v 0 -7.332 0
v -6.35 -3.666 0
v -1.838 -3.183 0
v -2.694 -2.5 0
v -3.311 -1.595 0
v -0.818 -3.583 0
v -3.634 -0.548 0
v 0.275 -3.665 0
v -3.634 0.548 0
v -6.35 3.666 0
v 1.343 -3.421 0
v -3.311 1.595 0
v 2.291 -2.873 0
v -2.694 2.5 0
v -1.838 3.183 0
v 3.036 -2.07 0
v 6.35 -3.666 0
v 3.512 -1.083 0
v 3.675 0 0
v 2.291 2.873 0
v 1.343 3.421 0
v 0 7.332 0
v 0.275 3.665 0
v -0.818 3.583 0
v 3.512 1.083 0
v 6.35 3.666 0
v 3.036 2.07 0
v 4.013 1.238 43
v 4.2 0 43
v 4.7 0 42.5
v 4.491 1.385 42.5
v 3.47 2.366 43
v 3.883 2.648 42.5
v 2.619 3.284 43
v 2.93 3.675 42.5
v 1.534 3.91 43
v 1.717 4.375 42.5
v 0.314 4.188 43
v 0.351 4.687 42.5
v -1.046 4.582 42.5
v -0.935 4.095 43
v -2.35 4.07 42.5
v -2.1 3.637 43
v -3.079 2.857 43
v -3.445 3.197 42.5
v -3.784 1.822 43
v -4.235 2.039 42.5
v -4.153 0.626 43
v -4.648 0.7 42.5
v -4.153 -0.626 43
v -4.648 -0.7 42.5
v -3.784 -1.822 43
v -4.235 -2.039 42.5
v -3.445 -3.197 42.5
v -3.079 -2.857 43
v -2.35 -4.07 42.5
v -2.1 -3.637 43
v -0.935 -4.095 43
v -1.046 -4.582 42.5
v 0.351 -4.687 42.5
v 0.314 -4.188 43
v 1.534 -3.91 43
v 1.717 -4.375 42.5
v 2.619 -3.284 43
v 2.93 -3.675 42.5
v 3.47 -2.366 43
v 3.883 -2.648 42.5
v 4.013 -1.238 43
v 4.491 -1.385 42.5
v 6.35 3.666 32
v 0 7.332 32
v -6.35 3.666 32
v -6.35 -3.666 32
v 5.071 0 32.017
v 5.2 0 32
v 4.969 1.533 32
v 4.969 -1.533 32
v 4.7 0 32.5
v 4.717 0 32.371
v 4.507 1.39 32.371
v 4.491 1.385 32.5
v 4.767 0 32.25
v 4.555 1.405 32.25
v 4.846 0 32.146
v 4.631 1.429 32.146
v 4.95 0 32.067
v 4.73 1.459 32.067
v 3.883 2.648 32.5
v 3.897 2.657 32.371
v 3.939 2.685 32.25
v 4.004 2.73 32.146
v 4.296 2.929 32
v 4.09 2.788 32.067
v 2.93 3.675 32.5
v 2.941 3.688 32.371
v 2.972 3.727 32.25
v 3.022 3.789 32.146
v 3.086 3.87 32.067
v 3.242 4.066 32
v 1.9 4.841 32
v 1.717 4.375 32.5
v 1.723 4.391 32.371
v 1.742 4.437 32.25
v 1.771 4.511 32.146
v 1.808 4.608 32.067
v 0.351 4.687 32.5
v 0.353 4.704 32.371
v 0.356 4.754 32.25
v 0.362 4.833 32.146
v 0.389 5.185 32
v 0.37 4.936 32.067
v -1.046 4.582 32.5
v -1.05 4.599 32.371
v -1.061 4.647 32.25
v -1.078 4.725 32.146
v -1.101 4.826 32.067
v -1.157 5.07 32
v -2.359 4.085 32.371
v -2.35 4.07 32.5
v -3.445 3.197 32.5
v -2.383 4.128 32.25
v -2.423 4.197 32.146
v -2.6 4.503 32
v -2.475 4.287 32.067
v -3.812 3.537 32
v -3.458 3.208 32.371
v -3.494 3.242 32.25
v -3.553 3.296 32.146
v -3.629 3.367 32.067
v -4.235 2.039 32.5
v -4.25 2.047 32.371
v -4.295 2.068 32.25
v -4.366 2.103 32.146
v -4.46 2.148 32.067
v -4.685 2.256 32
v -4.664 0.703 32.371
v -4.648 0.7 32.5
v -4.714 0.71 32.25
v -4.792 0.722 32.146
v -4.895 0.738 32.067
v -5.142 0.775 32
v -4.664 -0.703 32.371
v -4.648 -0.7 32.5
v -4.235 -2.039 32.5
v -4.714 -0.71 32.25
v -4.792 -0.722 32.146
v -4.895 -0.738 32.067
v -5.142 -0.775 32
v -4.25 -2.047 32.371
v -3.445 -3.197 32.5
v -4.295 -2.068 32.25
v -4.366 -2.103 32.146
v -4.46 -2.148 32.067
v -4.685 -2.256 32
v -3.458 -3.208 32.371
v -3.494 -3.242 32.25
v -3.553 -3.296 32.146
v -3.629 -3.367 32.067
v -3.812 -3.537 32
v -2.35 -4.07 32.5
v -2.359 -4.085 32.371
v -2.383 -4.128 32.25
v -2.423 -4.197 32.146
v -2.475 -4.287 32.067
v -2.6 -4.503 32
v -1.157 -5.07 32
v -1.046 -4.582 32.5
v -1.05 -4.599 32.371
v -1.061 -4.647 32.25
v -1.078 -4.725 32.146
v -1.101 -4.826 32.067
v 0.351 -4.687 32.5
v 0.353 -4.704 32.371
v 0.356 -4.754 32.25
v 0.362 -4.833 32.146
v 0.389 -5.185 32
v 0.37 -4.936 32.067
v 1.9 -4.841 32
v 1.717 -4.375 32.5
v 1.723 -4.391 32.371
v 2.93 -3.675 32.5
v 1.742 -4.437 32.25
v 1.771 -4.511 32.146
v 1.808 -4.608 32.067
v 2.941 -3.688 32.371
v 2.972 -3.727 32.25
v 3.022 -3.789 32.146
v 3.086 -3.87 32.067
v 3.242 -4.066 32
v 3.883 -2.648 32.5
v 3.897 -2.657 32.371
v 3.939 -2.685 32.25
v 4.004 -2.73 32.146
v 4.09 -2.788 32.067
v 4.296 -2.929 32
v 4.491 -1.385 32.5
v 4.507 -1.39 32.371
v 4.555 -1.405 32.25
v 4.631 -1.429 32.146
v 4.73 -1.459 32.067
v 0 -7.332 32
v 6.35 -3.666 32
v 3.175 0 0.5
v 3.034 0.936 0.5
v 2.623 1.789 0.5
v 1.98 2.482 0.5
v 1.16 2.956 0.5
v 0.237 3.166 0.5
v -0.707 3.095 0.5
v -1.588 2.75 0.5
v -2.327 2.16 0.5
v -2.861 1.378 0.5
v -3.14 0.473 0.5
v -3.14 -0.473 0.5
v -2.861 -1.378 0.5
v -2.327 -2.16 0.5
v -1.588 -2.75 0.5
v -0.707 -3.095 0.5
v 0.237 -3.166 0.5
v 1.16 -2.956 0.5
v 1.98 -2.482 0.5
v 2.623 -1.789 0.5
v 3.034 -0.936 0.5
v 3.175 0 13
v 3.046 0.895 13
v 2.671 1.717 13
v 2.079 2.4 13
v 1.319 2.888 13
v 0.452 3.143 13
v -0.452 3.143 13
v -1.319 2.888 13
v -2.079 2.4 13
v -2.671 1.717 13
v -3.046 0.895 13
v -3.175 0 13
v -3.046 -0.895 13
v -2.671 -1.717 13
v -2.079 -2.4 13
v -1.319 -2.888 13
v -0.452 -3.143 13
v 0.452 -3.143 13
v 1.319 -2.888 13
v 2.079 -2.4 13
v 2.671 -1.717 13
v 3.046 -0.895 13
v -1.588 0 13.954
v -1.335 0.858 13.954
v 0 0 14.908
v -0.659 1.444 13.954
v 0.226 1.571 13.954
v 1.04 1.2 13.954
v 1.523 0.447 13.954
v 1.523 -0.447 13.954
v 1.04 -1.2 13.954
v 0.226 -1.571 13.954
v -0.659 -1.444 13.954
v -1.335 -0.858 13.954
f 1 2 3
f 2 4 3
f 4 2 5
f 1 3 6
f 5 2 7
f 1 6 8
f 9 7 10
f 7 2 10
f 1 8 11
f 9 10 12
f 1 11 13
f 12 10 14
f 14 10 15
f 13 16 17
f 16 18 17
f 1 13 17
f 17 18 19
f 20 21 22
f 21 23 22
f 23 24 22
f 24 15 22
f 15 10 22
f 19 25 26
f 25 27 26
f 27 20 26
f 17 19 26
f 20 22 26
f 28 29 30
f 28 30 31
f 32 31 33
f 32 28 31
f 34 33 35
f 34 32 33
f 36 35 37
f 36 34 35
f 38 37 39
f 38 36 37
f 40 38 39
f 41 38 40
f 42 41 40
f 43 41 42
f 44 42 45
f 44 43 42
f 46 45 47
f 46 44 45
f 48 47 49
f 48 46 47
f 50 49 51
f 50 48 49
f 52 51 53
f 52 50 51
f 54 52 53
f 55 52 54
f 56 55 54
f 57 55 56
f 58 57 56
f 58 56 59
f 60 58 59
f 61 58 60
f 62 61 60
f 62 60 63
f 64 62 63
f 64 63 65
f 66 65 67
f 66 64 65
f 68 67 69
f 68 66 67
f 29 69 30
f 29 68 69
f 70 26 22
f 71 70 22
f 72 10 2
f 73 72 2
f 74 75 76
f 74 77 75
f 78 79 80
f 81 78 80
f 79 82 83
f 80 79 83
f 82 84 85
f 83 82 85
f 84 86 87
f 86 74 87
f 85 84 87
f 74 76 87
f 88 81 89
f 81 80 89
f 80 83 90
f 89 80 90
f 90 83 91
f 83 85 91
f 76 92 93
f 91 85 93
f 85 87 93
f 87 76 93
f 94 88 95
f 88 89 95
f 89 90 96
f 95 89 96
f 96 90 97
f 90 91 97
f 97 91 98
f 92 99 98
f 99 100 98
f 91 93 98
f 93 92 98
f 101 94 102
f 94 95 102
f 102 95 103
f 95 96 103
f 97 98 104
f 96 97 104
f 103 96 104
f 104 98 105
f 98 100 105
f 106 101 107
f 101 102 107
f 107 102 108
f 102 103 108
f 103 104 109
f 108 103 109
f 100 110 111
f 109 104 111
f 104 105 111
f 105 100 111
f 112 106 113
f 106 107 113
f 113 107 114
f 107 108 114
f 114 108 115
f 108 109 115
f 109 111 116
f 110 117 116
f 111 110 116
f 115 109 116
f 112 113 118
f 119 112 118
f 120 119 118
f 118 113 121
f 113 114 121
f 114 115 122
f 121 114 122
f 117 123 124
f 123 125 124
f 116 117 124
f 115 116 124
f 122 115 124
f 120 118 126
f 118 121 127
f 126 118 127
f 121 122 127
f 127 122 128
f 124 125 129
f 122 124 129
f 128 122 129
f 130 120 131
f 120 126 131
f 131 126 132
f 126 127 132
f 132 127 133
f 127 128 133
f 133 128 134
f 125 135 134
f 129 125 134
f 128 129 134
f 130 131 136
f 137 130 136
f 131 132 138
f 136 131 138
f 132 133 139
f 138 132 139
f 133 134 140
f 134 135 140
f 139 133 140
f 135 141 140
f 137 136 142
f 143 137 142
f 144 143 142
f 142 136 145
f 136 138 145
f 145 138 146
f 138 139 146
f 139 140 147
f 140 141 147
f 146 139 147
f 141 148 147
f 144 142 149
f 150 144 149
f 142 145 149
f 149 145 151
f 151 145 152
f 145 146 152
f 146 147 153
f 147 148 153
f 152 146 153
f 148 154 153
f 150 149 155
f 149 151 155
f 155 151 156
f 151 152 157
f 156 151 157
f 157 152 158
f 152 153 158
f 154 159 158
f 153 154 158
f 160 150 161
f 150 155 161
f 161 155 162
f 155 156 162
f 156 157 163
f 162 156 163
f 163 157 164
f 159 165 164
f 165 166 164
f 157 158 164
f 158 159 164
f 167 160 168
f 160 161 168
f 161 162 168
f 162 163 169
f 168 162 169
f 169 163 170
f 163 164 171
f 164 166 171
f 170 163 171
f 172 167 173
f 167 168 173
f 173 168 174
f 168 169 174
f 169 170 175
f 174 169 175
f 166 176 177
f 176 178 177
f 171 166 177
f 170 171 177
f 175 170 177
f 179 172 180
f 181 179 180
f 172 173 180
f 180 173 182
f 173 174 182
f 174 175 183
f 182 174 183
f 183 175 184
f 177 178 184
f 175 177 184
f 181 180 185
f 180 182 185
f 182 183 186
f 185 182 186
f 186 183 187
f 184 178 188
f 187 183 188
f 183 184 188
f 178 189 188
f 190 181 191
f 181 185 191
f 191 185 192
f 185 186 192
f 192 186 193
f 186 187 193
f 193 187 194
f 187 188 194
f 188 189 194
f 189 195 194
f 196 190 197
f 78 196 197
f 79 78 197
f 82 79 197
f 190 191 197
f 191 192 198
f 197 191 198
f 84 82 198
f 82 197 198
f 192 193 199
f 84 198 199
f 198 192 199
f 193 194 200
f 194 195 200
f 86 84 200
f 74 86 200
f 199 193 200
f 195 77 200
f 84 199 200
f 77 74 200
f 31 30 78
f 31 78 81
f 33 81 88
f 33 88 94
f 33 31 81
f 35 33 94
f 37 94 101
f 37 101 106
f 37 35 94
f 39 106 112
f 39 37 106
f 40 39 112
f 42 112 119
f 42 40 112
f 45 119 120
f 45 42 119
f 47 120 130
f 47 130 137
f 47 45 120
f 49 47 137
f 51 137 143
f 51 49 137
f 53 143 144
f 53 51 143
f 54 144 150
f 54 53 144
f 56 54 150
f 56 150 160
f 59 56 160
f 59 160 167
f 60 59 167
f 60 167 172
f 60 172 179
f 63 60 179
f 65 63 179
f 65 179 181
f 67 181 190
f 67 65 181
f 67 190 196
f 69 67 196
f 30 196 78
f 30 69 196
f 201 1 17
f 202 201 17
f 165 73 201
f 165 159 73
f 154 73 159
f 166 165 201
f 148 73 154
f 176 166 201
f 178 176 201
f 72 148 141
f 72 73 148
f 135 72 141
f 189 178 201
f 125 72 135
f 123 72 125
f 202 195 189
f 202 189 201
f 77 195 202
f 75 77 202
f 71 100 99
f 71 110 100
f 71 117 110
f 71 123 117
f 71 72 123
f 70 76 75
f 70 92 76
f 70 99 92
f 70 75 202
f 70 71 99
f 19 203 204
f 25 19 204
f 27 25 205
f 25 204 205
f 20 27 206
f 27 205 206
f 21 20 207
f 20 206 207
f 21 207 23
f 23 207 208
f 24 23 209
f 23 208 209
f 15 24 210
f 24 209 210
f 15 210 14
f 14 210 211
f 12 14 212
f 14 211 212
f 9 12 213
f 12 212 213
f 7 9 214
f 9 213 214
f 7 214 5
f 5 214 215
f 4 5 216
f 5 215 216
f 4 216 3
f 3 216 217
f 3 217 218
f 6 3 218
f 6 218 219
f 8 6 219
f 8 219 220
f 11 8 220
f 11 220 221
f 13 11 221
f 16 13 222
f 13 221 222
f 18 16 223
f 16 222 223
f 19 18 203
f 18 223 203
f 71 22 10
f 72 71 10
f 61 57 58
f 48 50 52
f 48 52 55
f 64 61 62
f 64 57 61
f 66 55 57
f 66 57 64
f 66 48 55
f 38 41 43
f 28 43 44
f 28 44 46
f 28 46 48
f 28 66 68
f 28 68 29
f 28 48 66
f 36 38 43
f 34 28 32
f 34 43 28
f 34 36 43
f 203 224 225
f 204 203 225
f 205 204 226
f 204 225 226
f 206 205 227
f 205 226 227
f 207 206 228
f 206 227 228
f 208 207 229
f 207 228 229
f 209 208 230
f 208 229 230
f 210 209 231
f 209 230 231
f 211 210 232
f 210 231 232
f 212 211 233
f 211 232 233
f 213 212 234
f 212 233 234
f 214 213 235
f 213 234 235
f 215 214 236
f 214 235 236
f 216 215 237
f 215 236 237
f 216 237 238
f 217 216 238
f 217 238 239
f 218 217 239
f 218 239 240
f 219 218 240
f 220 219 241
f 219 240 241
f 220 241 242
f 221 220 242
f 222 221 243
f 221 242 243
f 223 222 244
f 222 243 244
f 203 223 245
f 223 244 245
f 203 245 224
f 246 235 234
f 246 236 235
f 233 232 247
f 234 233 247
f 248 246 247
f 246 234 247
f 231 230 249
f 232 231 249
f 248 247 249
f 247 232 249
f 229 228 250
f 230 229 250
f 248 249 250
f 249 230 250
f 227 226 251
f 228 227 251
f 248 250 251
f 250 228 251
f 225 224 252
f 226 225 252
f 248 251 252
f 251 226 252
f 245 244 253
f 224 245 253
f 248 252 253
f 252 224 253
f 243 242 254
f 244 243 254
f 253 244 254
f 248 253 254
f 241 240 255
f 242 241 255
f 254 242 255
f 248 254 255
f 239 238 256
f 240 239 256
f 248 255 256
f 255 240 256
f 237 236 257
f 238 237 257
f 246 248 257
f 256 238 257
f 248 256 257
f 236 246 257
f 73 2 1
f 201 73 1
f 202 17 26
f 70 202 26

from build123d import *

# Parameters (mm, degrees)
BOSS_EXTRUDE1_DEPTH       = 43
SKETCH4_R                 = 10.207731482
SKETCH4_R_2               = 4.7
CUT_EXTRUDE3_DEPTH        = 11
CHAMFER3_SIZE             = 0.5
FILLET2_R                 = 0.5
F_1_0MM_DOWEL_HOLE1_D     = 6.35
F_1_0MM_DOWEL_HOLE1_DEPTH = 13
F_1_0MM_DOWEL_HOLE1_TIP   = 1.907732465
CHAMFER4_SIZE             = 0.5


with BuildPart() as part:
    # Sketch1 → Boss-Extrude1 (new body)
    with BuildSketch(Plane.XY):
        Polygon((0, 7.332348419), (-6.35, 3.666174209), (-6.35, -3.666174209), (0, -7.332348419), (6.35, -3.666174209), (6.35, 3.666174209), align=None)
    extrude(amount=BOSS_EXTRUDE1_DEPTH)

    # Sketch4 → Cut-Extrude3 (cut)
    with BuildSketch(Plane.XY.offset(43)):
        Circle(SKETCH4_R)
        Circle(SKETCH4_R_2, mode=Mode.SUBTRACT)
    extrude(amount=-CUT_EXTRUDE3_DEPTH, mode=Mode.SUBTRACT)

    # Chamfer3
    chamfer3_edges = [part.edges().sort_by_distance(p)[0] for p in [
        (-4.7, 0, 43),
    ]]
    chamfer(chamfer3_edges, length=CHAMFER3_SIZE)

    # Fillet2
    fillet2_edges = [part.edges().sort_by_distance(p)[0] for p in [
        (-4.7, 0, 32),
    ]]
    fillet(fillet2_edges, radius=FILLET2_R)

    # Ø1.0mm Dowel Hole1
    with Locations(Plane(origin=(0, 0, 0), x_dir=(-1, 0, 0), z_dir=(0, 0, -1))):
        with Locations((0, 0)):
            Hole(F_1_0MM_DOWEL_HOLE1_D / 2, depth=F_1_0MM_DOWEL_HOLE1_DEPTH)
            with Locations((0, 0, -(F_1_0MM_DOWEL_HOLE1_DEPTH + F_1_0MM_DOWEL_HOLE1_TIP / 2))):  # 118° drill point
                Cone(0, F_1_0MM_DOWEL_HOLE1_D / 2, F_1_0MM_DOWEL_HOLE1_TIP, mode=Mode.SUBTRACT)

    # Chamfer4
    chamfer4_edges = [part.edges().sort_by_distance(p)[0] for p in [
        (-3.175, 0, 0),
    ]]
    chamfer(chamfer4_edges, length=CHAMFER4_SIZE)


solid = part.part
